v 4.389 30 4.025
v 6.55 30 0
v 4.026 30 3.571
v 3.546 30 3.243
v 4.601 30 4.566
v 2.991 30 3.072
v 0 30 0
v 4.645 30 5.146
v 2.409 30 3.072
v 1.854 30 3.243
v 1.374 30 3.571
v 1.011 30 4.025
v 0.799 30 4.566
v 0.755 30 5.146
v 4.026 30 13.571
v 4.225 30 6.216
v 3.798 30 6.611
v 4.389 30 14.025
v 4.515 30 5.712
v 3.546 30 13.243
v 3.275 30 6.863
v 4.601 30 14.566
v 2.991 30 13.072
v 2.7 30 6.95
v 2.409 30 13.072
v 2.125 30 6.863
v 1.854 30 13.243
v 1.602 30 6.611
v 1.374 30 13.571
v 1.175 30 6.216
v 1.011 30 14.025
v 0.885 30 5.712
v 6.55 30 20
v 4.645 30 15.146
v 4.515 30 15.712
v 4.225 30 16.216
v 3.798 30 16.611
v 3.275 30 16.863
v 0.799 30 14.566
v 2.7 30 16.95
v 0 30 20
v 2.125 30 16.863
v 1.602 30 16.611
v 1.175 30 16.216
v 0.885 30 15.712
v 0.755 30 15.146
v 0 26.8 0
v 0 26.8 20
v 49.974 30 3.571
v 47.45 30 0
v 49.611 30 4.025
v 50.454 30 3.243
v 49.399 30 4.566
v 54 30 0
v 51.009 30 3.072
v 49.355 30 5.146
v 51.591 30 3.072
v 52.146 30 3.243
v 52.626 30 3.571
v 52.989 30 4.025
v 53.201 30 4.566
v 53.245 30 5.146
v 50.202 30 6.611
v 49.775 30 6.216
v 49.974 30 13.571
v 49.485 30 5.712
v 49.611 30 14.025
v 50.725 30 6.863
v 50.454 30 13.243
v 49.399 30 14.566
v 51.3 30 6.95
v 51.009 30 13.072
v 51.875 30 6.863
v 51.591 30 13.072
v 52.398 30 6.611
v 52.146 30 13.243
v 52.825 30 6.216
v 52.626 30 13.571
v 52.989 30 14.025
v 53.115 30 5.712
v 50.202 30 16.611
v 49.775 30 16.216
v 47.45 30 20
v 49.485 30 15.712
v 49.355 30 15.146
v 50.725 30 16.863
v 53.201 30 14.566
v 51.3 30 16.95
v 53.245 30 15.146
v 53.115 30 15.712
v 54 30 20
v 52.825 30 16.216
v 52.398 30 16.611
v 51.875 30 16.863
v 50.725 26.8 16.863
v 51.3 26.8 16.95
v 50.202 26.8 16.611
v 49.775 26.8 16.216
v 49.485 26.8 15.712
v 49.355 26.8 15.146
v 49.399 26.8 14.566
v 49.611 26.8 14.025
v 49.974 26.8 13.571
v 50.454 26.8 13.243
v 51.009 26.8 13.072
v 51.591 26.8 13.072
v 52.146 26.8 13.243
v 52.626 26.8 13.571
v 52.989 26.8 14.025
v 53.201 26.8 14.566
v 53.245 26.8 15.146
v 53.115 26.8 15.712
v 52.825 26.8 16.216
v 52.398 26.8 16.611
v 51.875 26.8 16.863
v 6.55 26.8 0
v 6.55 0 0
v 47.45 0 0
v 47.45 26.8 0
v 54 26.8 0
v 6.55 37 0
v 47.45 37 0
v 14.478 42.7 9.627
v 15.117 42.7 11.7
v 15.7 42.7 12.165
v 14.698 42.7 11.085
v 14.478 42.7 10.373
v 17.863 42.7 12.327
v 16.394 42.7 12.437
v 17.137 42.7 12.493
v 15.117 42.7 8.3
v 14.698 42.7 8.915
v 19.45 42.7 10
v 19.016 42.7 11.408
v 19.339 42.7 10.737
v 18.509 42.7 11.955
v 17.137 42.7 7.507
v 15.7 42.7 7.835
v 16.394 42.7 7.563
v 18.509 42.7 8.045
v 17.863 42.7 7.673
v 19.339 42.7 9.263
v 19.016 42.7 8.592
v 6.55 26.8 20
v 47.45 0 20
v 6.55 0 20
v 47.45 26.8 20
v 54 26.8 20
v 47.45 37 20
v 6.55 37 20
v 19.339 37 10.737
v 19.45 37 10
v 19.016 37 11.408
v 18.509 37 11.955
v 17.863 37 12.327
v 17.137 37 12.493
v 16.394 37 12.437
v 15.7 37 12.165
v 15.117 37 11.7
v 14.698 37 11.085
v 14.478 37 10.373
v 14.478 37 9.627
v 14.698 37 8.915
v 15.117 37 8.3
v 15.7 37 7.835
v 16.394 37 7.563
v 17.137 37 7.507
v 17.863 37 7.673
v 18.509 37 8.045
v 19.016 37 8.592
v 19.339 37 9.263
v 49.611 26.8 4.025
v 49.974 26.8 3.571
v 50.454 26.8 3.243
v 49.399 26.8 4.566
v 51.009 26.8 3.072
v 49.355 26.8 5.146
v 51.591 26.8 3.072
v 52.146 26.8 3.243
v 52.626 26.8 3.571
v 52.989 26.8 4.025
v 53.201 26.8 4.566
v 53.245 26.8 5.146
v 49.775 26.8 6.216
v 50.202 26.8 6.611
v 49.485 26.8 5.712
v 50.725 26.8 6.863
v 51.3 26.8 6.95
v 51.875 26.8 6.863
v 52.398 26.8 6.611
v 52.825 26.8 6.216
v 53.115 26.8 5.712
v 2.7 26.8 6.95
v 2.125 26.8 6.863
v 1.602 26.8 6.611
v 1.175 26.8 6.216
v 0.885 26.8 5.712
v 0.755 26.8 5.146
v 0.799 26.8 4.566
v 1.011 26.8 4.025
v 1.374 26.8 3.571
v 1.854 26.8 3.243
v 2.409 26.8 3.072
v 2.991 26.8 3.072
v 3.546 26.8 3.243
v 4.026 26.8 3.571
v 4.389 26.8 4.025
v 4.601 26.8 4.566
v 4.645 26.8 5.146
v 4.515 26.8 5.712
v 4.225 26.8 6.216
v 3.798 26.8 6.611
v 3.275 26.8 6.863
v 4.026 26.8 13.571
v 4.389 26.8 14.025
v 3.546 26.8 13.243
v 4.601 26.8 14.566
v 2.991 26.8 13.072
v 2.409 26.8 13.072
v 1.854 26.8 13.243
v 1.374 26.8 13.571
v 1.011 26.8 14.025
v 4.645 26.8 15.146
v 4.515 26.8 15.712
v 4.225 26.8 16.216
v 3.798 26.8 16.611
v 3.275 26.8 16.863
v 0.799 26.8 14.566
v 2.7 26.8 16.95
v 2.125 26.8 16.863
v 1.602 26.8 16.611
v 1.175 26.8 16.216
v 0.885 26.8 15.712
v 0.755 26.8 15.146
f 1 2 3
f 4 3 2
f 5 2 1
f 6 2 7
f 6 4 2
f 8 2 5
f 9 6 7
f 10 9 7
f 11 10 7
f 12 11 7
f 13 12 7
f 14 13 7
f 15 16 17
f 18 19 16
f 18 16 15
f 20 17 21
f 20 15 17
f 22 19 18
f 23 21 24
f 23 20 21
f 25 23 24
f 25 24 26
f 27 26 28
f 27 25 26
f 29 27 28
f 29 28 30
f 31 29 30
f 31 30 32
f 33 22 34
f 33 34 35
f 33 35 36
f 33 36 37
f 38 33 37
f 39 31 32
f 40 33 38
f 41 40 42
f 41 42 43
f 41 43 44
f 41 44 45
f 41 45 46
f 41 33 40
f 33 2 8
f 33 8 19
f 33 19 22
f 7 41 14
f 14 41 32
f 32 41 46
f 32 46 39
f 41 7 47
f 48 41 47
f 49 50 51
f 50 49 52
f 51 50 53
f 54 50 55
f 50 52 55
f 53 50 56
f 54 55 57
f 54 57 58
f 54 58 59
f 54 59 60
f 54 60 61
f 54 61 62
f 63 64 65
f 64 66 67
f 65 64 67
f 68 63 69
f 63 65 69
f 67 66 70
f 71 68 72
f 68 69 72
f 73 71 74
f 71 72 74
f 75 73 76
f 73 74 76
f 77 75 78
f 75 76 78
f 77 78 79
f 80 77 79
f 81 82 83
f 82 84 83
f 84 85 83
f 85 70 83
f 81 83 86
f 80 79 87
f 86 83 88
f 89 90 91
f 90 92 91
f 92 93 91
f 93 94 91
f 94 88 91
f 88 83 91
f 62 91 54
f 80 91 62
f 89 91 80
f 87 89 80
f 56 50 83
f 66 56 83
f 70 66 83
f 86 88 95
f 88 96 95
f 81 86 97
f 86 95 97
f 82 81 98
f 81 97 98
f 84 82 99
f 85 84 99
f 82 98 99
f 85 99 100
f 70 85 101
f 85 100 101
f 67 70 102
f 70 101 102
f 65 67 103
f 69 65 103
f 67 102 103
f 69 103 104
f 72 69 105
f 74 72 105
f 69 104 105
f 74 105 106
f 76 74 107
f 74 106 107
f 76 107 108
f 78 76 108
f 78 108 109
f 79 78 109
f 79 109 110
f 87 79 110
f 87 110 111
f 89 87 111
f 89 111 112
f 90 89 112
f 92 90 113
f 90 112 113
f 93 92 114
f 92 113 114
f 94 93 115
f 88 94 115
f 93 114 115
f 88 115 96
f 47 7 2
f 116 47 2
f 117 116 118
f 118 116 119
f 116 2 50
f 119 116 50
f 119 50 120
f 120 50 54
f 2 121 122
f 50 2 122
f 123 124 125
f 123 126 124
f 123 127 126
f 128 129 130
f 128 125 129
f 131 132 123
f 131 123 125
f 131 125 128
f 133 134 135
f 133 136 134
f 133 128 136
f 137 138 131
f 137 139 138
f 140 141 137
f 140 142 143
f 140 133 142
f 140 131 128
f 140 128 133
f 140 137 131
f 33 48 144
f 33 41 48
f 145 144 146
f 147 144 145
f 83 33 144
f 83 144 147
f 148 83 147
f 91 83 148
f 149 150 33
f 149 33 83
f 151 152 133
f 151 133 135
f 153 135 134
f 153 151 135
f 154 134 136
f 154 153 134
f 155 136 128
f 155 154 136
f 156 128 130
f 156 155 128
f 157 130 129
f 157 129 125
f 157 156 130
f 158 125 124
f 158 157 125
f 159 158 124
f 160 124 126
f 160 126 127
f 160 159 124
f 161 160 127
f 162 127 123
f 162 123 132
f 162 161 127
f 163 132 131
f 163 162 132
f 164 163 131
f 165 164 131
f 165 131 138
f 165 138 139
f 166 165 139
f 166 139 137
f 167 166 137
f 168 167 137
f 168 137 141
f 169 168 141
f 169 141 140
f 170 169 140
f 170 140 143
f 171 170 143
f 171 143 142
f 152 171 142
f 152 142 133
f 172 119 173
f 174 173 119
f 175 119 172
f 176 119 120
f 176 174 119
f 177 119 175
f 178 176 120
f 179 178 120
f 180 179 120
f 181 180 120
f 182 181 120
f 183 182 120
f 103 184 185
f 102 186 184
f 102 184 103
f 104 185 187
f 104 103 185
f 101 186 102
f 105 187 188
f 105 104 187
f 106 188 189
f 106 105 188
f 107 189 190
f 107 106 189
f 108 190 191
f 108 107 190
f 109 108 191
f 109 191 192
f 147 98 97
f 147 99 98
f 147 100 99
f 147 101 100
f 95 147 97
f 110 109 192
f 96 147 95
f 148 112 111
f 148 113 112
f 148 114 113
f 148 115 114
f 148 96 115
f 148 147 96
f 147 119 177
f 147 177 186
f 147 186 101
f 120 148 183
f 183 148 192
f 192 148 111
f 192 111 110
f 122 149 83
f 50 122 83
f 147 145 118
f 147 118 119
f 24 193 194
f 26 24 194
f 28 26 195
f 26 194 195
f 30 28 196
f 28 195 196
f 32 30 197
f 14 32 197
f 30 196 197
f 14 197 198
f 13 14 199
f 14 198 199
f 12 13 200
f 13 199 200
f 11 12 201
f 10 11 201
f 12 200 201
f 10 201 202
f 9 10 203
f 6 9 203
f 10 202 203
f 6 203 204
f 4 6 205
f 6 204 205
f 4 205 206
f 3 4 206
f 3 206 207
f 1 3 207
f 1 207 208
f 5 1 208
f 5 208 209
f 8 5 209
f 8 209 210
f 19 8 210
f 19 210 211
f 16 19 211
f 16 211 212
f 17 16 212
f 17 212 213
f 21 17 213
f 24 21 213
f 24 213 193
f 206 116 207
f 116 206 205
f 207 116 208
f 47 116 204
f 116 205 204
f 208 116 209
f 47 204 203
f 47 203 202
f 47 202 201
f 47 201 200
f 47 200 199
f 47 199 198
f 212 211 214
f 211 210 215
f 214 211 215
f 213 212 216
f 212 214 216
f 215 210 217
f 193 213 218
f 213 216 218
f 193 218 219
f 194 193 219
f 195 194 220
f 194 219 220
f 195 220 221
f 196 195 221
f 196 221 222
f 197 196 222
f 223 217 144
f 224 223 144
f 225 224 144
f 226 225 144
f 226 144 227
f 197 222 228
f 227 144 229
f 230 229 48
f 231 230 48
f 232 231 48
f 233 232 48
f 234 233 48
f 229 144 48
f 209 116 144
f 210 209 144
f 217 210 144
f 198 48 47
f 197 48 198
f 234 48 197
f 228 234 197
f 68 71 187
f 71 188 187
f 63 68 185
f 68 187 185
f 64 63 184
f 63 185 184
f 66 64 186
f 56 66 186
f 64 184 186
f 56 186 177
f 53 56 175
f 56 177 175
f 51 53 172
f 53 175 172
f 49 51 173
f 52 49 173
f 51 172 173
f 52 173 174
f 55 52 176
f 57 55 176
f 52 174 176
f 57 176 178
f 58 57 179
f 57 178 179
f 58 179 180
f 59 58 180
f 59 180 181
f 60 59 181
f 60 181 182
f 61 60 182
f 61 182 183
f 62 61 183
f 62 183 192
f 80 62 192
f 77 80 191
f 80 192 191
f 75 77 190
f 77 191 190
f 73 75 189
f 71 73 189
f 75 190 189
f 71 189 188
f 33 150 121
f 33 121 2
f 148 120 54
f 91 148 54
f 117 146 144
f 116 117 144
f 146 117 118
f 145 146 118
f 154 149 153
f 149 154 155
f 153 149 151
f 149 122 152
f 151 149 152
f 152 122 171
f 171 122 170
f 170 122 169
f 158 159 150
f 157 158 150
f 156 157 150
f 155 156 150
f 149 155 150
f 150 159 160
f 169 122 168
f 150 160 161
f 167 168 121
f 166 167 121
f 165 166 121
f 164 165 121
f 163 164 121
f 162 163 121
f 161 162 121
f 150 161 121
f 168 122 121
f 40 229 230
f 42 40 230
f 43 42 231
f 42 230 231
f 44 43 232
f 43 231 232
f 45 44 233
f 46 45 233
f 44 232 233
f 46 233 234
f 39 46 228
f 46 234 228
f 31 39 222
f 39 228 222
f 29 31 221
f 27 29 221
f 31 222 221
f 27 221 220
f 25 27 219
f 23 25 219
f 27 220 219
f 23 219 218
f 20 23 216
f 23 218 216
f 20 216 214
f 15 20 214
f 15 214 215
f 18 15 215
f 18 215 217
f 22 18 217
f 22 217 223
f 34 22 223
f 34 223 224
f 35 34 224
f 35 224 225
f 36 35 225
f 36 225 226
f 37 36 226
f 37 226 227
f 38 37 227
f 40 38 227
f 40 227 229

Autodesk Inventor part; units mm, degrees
ref_plane "YZ Plane" through (0, 0, 0) normal (1, 0, 0) x (0, 1, 0)
ref_plane "XZ Plane" through (0, 0, 0) normal (0, 1, 0) x (-1, 0, 0)
ref_plane "XY Plane" through (0, 0, 0) normal (0, 0, 1) x (1, 0, 0)
sketch "スケッチ12" plane through (0, 0, 0) normal (0, 0, 1) x (1, 0, 0)
  line L0 (0, 0) -> (54, 0)
  line L1 (54, 0) -> (54, 37)
  line L2 (54, 37) -> (0, 37)
  line L3 (0, 37) -> (0, 0)
  dimension "d76" = 54
  dimension "d77" = 37
extrude "押し出し7" add sketch "スケッチ12" along normal blind 20
sketch "スケッチ14" plane through (0, 37, 0) normal (0, 1, 0) x (1, 0, 0)
  line L0 (54, 0) -> (54, -20) projected
  line L1 (54, 0) -> (0, 0) projected
  line L2 (0, 0) -> (0, -20) projected
  point P0 (2.7, -5)
  point P1 (2.7, -15)
  point P2 (51.3, -5)
  point P3 (51.3, -15)
  dimension "d80" = 48.6
  dimension "d81" = 10
  dimension "d82" = 10
  dimension "d83" = 2.7
  dimension "d84" = 5
  dimension "d85" = 5
  dimension "d86" = 2.7
  dimension "d87" = 2.7
hole "穴3" at (2.7, 37, 5) at (2.7, 37, 15) at (51.3, 37, 5) at (51.3, 37, 15) direction (0, -1, 0) diameter 3.9 end through all
sketch "スケッチ15" plane through (0, 0, 20) normal (0, 0, 1) x (1, 0, 0)
  line L0 (0, 0) -> (6.55, 0)
  line L1 (6.55, 0) -> (6.55, 26.8)
  line L2 (6.55, 26.8) -> (0, 26.8)
  line L3 (0, 26.8) -> (0, 0)
  line L4 (54, 0) -> (54, 37) projected
  line L5 (54, 0) -> (47.45, 0)
  line L6 (47.45, 0) -> (47.45, 26.8)
  line L7 (47.45, 26.8) -> (54, 26.8)
  line L8 (54, 26.8) -> (54, 0)
  line L9 (54, 37) -> (0, 37) projected
  line L10 (0, 37) -> (6.55, 37)
  line L11 (6.55, 37) -> (6.55, 30)
  line L12 (6.55, 30) -> (0, 30)
  line L13 (0, 30) -> (0, 37)
  line L14 (54, 37) -> (47.45, 37)
  line L15 (47.45, 37) -> (47.45, 30)
  line L16 (47.45, 30) -> (54, 30)
  line L17 (54, 30) -> (54, 37)
  dimension "d100" = 26.8
  dimension "d101" = 6.55
  dimension "d102" = 40.9
  dimension "d103" = 7
extrude "押し出し8" cut sketch "スケッチ15" against normal blind 20
sketch "スケッチ16" plane through (6.55, 37, 0) normal (0, 1, 0) x (1, 0, 0)
  line L0 (47.45, -20) -> (47.45, 0) projected
  line L1 (47.45, -10) -> (-12.7368, -10)
  line L2 (-6.55, -20) -> (-6.55, 0) projected
  circle A0 centre (10.4, -10) radius 2.5
  circle A1 centre (44.75, -15) radius 1.95 projected
  dimension "d106" = 5
  dimension "d107" = 34.35
extrude "押し出し9" add sketch "スケッチ16" along normal blind 5.7 contours A0 L1 | L1 A0
equation "\"d85\" = d84"
equation "\"d86\" = d83"
properties part number "servo"
